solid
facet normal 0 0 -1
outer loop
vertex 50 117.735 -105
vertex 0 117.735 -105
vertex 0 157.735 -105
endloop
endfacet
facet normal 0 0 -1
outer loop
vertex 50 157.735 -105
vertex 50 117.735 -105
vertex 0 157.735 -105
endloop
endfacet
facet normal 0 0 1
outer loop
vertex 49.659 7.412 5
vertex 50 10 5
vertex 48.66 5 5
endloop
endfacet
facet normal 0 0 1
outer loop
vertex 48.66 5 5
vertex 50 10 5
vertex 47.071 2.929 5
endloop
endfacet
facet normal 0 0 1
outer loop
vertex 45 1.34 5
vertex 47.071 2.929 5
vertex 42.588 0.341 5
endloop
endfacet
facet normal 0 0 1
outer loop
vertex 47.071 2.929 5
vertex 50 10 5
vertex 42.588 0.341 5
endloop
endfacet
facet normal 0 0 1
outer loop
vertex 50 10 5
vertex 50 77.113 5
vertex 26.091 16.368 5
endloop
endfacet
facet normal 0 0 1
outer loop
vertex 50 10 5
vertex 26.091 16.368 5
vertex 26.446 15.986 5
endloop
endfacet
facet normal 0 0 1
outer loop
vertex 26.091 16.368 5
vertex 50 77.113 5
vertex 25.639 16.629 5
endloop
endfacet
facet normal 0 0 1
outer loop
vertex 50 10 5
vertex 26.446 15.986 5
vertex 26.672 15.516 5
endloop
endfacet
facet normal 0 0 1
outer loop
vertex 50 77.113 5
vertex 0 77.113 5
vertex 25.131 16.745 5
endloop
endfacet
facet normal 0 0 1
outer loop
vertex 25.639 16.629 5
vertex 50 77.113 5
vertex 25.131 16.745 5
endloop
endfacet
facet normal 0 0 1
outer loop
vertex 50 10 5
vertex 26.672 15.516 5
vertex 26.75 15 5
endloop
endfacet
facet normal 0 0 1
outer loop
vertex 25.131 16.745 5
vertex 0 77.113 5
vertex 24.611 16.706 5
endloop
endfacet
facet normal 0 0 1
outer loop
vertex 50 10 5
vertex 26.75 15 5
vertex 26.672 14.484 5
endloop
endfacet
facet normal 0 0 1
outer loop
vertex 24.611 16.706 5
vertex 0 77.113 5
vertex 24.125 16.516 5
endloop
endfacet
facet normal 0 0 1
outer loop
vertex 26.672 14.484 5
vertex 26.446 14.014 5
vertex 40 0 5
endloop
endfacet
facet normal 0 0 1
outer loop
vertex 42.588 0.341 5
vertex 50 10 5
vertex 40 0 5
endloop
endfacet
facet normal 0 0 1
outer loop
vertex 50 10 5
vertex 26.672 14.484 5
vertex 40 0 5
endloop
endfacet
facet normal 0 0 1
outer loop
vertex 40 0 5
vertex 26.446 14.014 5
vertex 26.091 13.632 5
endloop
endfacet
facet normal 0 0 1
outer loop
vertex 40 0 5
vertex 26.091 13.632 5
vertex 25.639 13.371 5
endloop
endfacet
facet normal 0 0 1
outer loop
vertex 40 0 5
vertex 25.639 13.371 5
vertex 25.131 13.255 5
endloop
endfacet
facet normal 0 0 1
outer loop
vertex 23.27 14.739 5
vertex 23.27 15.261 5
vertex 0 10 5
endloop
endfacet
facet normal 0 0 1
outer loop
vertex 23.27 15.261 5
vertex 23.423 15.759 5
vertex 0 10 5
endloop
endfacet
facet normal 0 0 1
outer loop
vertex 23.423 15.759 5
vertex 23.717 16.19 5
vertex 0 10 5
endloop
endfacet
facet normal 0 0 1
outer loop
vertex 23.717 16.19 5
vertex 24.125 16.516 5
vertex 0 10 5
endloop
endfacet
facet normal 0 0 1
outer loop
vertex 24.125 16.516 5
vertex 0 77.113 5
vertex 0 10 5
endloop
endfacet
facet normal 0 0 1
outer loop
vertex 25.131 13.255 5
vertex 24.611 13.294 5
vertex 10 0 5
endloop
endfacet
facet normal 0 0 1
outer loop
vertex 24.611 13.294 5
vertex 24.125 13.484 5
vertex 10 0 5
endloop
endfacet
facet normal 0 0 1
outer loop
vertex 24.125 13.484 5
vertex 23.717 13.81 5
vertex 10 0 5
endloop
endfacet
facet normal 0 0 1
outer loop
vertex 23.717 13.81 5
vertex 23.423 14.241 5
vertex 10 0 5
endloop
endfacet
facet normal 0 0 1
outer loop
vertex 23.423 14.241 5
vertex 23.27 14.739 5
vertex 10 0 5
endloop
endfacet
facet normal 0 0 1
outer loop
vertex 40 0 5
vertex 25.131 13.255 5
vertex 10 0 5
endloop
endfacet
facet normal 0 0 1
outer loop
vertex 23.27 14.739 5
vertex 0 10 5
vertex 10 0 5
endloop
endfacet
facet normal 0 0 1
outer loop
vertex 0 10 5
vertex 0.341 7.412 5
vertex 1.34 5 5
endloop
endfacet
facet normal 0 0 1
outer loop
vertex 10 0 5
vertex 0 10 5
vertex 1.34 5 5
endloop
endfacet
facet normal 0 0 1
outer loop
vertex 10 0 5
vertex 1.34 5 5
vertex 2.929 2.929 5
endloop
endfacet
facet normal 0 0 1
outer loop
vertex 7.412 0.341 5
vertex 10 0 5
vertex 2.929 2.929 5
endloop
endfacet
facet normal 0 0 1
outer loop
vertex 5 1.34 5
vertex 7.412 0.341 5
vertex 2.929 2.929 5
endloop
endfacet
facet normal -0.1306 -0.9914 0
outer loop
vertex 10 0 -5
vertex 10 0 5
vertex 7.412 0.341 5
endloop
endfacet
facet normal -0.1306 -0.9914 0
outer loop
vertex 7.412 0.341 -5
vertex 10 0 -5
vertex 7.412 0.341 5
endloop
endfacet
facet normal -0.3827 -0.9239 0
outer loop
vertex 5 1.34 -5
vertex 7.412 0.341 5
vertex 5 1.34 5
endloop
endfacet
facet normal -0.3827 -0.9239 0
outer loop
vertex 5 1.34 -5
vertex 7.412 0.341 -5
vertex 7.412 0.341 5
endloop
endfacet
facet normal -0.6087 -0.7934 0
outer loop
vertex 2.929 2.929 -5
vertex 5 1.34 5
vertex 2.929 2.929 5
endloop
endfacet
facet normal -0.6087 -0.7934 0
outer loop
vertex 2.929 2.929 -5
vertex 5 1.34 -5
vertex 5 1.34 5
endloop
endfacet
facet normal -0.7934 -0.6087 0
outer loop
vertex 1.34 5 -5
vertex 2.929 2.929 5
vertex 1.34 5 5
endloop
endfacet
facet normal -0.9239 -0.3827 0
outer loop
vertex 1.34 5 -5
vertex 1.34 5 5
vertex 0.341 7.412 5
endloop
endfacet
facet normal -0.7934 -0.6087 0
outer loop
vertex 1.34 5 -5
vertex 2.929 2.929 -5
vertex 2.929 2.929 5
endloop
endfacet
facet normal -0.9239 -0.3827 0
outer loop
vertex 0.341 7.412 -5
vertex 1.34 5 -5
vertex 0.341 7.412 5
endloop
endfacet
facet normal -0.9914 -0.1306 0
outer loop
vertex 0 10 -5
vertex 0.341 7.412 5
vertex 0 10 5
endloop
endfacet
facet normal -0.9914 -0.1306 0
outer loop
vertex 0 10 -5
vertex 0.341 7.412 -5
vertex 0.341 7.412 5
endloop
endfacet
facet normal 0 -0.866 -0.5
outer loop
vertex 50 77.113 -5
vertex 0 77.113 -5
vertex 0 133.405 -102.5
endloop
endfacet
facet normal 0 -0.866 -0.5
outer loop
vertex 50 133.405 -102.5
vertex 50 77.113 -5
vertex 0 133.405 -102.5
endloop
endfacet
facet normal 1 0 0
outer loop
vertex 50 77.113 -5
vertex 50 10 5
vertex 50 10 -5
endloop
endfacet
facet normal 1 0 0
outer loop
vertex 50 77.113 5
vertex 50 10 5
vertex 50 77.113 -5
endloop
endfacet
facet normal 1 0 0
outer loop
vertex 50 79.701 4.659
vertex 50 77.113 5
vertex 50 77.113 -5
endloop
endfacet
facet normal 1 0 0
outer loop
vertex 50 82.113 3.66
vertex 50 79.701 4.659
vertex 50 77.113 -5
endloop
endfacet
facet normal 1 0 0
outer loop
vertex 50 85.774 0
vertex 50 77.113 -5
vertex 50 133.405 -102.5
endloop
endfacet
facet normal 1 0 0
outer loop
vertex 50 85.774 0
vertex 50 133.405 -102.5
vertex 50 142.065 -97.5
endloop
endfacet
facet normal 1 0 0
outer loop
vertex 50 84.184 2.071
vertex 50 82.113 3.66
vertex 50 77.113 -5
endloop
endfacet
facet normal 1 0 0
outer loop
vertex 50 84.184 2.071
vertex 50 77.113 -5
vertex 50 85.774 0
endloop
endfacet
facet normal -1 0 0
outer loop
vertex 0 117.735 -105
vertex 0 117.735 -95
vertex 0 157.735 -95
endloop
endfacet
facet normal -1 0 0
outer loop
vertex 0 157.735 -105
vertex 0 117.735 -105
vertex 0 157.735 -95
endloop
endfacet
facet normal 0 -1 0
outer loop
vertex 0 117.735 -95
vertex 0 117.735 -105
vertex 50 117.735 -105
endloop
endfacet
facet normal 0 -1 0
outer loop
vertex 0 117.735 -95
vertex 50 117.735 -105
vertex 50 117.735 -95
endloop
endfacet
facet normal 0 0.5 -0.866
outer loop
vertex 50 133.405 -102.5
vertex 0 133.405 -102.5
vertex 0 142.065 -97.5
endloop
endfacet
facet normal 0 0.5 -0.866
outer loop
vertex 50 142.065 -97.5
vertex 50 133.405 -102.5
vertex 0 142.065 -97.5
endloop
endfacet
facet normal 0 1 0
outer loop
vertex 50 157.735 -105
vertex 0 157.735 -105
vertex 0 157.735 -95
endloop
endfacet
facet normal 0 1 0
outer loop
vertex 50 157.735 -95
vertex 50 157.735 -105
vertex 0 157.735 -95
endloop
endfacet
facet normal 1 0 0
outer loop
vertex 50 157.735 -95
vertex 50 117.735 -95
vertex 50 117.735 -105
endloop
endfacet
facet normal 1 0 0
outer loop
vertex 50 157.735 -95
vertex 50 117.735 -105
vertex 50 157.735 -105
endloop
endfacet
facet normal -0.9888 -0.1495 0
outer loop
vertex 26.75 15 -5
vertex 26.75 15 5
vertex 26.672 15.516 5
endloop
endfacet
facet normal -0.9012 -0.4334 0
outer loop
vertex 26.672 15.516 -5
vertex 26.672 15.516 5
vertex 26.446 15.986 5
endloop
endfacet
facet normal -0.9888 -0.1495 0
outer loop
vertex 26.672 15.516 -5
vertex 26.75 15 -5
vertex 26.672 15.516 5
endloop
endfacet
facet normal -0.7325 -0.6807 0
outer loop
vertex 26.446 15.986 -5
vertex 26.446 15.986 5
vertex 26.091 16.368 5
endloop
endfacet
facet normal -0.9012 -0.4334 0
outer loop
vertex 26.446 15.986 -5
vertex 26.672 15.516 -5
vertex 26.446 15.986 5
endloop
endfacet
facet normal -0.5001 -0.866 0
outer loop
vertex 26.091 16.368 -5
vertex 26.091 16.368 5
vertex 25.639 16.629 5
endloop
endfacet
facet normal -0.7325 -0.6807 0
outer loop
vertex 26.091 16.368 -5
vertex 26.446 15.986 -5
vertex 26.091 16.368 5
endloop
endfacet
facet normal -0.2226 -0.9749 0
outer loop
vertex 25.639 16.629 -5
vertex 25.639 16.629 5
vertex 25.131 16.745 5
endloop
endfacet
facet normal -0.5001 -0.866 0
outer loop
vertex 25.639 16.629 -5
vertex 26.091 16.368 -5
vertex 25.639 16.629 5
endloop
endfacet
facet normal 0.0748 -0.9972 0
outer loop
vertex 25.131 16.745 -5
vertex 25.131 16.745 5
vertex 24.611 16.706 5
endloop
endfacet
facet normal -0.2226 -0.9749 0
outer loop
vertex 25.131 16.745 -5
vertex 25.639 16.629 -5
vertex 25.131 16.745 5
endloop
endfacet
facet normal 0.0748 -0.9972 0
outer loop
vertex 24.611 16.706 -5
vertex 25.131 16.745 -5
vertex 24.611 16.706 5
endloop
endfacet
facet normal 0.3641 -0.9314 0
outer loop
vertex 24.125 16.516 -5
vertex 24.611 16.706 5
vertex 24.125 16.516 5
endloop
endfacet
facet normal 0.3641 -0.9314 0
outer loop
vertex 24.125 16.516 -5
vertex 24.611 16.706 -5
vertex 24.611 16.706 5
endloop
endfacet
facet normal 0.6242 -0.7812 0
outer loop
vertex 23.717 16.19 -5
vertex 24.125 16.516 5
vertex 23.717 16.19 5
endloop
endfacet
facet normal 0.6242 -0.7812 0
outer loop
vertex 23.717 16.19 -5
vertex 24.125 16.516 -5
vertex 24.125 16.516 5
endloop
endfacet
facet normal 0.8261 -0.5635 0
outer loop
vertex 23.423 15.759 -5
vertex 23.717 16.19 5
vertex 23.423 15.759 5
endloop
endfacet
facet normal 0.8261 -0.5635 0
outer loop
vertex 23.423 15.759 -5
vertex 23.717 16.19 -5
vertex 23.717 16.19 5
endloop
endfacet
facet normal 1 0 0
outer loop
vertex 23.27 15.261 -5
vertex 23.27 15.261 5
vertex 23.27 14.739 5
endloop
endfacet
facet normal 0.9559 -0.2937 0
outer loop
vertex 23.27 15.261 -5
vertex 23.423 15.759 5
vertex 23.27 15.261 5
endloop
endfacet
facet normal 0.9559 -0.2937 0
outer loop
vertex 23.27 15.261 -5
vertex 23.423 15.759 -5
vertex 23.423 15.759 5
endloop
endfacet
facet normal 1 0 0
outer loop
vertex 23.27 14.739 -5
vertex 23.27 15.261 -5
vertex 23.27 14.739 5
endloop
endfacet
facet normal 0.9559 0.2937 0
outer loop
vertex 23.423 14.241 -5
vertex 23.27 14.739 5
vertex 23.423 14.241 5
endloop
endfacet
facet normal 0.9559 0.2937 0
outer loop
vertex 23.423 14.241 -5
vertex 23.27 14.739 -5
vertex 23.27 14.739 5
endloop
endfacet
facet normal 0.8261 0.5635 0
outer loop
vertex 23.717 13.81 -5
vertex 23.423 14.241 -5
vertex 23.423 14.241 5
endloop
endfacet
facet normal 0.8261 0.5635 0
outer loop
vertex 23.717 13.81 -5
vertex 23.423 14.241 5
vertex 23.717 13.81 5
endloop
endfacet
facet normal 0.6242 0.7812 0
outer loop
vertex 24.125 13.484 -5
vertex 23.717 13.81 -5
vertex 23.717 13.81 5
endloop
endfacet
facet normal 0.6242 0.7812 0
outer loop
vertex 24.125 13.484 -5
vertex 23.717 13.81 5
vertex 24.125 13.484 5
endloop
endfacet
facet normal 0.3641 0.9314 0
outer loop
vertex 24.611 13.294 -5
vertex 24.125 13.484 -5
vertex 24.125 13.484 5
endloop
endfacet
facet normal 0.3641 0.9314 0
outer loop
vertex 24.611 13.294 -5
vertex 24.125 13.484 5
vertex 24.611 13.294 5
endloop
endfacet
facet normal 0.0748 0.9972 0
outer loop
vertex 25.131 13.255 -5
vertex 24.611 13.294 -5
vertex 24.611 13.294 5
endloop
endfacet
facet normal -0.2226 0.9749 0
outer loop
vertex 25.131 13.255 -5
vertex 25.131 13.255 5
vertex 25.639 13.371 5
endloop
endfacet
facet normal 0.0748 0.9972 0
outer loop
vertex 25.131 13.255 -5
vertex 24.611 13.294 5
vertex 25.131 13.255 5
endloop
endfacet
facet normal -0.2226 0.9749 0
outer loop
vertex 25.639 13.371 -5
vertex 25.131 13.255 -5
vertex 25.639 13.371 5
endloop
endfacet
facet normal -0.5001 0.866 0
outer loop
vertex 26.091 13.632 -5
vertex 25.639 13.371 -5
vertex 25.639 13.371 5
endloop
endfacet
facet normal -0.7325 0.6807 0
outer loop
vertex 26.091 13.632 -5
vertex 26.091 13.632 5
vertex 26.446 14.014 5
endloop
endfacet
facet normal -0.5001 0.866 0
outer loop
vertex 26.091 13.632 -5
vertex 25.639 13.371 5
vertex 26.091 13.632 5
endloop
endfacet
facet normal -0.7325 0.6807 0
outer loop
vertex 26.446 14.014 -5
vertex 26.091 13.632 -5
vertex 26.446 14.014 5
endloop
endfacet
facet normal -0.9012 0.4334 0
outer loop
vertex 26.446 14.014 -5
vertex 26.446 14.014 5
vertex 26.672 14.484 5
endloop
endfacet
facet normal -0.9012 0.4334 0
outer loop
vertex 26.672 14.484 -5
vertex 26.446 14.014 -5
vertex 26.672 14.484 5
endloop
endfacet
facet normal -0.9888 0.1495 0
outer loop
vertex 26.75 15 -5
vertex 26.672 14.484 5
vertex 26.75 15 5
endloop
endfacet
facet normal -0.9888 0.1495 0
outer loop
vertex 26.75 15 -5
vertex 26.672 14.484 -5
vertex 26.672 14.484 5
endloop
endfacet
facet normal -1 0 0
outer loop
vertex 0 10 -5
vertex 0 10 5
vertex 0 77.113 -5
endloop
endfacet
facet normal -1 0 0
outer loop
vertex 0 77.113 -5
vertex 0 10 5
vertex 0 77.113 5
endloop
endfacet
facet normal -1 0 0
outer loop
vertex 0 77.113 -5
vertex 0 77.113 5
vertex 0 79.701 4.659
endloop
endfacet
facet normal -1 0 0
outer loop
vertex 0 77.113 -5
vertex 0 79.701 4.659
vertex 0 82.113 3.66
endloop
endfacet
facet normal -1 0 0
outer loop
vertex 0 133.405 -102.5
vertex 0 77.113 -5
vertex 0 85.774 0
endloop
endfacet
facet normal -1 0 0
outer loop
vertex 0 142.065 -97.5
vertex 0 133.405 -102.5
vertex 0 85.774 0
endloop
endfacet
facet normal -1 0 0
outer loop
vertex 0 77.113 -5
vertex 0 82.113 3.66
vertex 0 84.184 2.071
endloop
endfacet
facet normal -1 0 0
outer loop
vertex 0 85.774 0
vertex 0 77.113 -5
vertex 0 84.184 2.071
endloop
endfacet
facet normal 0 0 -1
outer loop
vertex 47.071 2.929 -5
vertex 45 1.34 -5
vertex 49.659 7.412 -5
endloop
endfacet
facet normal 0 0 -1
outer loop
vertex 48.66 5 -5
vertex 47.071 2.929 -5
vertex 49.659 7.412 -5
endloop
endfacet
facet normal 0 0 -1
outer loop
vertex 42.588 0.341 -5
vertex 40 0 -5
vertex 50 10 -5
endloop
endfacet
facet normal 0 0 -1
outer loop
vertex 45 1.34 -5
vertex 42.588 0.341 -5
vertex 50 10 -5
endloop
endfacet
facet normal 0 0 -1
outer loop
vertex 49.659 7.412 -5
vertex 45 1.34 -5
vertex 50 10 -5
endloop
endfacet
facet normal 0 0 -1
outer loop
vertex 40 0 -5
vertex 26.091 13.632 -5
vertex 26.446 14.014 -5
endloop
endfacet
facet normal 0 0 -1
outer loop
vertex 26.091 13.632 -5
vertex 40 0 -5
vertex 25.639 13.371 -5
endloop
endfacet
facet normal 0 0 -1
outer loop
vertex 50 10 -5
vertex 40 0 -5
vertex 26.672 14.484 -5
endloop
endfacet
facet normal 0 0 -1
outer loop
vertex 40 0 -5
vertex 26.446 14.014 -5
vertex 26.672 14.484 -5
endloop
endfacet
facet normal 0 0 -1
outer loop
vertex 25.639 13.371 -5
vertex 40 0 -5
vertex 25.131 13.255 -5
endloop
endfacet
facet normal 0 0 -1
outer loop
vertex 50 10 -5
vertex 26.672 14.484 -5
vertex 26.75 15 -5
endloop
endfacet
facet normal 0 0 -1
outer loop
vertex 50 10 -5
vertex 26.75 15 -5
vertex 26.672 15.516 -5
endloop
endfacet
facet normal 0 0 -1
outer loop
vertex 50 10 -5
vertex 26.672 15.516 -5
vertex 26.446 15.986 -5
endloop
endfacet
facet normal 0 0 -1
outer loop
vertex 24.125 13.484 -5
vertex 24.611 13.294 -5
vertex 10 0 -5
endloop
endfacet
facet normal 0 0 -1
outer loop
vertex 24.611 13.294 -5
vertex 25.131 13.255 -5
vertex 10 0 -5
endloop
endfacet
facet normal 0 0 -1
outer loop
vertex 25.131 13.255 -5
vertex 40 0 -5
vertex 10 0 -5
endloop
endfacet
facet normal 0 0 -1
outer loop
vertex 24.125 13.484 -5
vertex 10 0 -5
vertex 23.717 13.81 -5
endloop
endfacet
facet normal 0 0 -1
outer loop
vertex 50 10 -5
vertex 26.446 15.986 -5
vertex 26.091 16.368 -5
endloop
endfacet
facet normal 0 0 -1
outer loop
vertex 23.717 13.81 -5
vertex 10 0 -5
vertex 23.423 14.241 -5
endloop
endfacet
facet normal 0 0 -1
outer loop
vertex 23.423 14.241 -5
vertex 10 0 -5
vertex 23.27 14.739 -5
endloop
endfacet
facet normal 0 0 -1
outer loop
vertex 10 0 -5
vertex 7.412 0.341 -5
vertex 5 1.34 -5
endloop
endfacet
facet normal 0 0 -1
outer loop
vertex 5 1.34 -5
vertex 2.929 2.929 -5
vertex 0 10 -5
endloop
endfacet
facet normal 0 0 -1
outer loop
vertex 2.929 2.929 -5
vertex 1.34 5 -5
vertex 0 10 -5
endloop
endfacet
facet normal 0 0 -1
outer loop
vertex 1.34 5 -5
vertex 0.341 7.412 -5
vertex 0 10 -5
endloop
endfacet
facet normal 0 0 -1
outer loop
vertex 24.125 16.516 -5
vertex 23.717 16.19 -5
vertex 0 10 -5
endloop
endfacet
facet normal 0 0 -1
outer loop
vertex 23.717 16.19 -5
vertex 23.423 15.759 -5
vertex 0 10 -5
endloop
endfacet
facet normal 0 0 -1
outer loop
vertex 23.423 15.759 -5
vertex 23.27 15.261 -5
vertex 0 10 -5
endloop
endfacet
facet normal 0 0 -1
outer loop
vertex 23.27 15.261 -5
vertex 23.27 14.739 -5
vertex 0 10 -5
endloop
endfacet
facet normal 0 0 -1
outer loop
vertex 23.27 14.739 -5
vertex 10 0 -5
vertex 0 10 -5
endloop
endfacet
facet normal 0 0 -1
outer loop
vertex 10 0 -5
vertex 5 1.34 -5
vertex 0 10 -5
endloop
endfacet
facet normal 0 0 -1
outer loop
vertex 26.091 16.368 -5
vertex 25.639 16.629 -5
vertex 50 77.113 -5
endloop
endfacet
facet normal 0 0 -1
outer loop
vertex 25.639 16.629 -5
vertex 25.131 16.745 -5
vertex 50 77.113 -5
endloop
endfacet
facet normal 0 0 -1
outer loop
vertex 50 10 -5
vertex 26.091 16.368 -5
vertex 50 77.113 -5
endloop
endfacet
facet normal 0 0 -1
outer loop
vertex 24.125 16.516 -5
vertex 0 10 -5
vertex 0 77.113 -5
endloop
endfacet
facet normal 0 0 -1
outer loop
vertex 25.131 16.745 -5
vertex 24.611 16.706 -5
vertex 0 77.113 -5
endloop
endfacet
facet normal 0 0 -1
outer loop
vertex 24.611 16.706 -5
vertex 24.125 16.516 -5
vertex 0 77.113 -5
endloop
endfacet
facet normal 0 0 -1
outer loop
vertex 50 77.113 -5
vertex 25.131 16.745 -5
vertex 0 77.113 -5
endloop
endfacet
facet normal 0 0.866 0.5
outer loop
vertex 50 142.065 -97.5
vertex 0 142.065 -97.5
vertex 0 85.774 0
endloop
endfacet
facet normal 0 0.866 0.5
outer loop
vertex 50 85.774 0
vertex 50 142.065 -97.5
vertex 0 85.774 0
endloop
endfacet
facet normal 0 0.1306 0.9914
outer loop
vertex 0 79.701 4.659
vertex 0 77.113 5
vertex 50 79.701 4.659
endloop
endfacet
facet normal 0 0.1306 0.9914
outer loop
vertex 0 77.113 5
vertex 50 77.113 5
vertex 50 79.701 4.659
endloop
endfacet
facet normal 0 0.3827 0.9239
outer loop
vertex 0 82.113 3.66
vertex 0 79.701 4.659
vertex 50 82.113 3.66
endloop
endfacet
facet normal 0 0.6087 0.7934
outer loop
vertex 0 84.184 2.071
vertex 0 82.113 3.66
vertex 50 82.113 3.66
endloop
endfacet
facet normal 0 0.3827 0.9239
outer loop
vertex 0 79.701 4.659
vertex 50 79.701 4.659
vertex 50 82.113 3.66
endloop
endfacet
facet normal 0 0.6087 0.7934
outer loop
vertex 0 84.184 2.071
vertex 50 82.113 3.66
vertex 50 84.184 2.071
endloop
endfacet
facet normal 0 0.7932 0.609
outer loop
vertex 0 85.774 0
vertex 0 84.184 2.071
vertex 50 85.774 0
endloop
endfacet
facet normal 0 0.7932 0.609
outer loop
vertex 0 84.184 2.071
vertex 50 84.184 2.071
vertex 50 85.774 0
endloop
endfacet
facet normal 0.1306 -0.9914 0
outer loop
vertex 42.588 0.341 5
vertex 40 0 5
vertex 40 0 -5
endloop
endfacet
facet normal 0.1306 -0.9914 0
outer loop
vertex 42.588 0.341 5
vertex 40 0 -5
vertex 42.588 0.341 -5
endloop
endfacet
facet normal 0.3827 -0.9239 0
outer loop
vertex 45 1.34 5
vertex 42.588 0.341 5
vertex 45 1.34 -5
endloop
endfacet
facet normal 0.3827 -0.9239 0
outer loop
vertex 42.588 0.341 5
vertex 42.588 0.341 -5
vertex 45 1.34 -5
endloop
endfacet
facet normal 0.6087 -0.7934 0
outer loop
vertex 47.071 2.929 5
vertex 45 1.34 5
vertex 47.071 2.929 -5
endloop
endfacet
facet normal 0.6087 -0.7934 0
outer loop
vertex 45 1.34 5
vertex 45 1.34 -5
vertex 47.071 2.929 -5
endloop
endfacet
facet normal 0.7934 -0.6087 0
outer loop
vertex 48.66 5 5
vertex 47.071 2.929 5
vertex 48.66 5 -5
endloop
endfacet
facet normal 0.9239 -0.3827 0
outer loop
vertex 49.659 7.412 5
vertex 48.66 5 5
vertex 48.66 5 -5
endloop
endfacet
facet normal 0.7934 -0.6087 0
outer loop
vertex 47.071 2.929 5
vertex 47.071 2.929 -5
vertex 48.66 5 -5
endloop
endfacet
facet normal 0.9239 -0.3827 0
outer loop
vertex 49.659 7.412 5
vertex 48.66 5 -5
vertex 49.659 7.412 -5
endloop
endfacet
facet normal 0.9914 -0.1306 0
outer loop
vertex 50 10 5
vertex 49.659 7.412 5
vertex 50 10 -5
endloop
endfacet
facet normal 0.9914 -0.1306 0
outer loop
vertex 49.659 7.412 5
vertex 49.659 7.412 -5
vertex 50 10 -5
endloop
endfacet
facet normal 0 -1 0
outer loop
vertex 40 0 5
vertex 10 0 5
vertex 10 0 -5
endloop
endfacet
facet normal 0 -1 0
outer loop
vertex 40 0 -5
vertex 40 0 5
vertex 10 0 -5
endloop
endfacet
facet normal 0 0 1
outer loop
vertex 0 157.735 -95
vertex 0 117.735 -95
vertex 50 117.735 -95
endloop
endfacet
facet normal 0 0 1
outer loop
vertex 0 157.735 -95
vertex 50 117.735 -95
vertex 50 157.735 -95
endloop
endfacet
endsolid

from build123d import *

# Parameters (mm, degrees)
EXTRUDE_THIN1_DEPTH     = 50
SKETCH2_W               = 40
SKETCH2_H               = 10
EXTRUDE_THIN1_2_DEPTH   = 50
FILLET2_R               = 10
FILLET3_R               = 10
CUT_EXTRUDE1_DEPTH      = 196.972800963
CUT_EXTRUDE1_DEPTH_BACK = 5
SKETCH3_R               = 1.75


with BuildPart() as part:
    # Sketch2 → Extrude-Thin1 (new body)
    with BuildSketch(Plane.YZ):
        Polygon((0, -5), (77.113248654, -5), (133.4048999, -102.5), (142.065153938, -97.5), (82.886751346, 5), (0, 5), align=None)
    extrude(amount=EXTRUDE_THIN1_DEPTH)

    # Fillet2
    fillet2_edges = [part.edges().sort_by_distance(p)[0] for p in [
        (50, 0, 0),
        (0, 0, 0),
    ]]
    fillet(fillet2_edges, radius=FILLET2_R)

    # Fillet3
    fillet3_edges = [part.edges().sort_by_distance(p)[0] for p in [
        (25, 82.886751346, 5),
    ]]
    fillet(fillet3_edges, radius=FILLET3_R)

    # Sketch3 → Cut-Extrude1 (cut, two sides: drawn at the far end of the back side and taken through both)
    with BuildSketch(Plane(origin=(0, 0, 0), x_dir=(0, 1, 0), z_dir=(0, 0, 1)).offset(-CUT_EXTRUDE1_DEPTH_BACK)):
        with Locations(Location((15, -25, 0), (0, 0, 270))):
            Circle(SKETCH3_R)
    extrude(amount=CUT_EXTRUDE1_DEPTH + CUT_EXTRUDE1_DEPTH_BACK, mode=Mode.SUBTRACT)


with BuildPart() as body_2:
    # Sketch2 → Extrude-Thin1 2 (new body)
    with BuildSketch(Plane.YZ):
        with Locations((137.735026919, -100)):
            Rectangle(SKETCH2_W, SKETCH2_H)
    extrude(amount=EXTRUDE_THIN1_2_DEPTH)


solid = Compound([part.part, body_2.part])
